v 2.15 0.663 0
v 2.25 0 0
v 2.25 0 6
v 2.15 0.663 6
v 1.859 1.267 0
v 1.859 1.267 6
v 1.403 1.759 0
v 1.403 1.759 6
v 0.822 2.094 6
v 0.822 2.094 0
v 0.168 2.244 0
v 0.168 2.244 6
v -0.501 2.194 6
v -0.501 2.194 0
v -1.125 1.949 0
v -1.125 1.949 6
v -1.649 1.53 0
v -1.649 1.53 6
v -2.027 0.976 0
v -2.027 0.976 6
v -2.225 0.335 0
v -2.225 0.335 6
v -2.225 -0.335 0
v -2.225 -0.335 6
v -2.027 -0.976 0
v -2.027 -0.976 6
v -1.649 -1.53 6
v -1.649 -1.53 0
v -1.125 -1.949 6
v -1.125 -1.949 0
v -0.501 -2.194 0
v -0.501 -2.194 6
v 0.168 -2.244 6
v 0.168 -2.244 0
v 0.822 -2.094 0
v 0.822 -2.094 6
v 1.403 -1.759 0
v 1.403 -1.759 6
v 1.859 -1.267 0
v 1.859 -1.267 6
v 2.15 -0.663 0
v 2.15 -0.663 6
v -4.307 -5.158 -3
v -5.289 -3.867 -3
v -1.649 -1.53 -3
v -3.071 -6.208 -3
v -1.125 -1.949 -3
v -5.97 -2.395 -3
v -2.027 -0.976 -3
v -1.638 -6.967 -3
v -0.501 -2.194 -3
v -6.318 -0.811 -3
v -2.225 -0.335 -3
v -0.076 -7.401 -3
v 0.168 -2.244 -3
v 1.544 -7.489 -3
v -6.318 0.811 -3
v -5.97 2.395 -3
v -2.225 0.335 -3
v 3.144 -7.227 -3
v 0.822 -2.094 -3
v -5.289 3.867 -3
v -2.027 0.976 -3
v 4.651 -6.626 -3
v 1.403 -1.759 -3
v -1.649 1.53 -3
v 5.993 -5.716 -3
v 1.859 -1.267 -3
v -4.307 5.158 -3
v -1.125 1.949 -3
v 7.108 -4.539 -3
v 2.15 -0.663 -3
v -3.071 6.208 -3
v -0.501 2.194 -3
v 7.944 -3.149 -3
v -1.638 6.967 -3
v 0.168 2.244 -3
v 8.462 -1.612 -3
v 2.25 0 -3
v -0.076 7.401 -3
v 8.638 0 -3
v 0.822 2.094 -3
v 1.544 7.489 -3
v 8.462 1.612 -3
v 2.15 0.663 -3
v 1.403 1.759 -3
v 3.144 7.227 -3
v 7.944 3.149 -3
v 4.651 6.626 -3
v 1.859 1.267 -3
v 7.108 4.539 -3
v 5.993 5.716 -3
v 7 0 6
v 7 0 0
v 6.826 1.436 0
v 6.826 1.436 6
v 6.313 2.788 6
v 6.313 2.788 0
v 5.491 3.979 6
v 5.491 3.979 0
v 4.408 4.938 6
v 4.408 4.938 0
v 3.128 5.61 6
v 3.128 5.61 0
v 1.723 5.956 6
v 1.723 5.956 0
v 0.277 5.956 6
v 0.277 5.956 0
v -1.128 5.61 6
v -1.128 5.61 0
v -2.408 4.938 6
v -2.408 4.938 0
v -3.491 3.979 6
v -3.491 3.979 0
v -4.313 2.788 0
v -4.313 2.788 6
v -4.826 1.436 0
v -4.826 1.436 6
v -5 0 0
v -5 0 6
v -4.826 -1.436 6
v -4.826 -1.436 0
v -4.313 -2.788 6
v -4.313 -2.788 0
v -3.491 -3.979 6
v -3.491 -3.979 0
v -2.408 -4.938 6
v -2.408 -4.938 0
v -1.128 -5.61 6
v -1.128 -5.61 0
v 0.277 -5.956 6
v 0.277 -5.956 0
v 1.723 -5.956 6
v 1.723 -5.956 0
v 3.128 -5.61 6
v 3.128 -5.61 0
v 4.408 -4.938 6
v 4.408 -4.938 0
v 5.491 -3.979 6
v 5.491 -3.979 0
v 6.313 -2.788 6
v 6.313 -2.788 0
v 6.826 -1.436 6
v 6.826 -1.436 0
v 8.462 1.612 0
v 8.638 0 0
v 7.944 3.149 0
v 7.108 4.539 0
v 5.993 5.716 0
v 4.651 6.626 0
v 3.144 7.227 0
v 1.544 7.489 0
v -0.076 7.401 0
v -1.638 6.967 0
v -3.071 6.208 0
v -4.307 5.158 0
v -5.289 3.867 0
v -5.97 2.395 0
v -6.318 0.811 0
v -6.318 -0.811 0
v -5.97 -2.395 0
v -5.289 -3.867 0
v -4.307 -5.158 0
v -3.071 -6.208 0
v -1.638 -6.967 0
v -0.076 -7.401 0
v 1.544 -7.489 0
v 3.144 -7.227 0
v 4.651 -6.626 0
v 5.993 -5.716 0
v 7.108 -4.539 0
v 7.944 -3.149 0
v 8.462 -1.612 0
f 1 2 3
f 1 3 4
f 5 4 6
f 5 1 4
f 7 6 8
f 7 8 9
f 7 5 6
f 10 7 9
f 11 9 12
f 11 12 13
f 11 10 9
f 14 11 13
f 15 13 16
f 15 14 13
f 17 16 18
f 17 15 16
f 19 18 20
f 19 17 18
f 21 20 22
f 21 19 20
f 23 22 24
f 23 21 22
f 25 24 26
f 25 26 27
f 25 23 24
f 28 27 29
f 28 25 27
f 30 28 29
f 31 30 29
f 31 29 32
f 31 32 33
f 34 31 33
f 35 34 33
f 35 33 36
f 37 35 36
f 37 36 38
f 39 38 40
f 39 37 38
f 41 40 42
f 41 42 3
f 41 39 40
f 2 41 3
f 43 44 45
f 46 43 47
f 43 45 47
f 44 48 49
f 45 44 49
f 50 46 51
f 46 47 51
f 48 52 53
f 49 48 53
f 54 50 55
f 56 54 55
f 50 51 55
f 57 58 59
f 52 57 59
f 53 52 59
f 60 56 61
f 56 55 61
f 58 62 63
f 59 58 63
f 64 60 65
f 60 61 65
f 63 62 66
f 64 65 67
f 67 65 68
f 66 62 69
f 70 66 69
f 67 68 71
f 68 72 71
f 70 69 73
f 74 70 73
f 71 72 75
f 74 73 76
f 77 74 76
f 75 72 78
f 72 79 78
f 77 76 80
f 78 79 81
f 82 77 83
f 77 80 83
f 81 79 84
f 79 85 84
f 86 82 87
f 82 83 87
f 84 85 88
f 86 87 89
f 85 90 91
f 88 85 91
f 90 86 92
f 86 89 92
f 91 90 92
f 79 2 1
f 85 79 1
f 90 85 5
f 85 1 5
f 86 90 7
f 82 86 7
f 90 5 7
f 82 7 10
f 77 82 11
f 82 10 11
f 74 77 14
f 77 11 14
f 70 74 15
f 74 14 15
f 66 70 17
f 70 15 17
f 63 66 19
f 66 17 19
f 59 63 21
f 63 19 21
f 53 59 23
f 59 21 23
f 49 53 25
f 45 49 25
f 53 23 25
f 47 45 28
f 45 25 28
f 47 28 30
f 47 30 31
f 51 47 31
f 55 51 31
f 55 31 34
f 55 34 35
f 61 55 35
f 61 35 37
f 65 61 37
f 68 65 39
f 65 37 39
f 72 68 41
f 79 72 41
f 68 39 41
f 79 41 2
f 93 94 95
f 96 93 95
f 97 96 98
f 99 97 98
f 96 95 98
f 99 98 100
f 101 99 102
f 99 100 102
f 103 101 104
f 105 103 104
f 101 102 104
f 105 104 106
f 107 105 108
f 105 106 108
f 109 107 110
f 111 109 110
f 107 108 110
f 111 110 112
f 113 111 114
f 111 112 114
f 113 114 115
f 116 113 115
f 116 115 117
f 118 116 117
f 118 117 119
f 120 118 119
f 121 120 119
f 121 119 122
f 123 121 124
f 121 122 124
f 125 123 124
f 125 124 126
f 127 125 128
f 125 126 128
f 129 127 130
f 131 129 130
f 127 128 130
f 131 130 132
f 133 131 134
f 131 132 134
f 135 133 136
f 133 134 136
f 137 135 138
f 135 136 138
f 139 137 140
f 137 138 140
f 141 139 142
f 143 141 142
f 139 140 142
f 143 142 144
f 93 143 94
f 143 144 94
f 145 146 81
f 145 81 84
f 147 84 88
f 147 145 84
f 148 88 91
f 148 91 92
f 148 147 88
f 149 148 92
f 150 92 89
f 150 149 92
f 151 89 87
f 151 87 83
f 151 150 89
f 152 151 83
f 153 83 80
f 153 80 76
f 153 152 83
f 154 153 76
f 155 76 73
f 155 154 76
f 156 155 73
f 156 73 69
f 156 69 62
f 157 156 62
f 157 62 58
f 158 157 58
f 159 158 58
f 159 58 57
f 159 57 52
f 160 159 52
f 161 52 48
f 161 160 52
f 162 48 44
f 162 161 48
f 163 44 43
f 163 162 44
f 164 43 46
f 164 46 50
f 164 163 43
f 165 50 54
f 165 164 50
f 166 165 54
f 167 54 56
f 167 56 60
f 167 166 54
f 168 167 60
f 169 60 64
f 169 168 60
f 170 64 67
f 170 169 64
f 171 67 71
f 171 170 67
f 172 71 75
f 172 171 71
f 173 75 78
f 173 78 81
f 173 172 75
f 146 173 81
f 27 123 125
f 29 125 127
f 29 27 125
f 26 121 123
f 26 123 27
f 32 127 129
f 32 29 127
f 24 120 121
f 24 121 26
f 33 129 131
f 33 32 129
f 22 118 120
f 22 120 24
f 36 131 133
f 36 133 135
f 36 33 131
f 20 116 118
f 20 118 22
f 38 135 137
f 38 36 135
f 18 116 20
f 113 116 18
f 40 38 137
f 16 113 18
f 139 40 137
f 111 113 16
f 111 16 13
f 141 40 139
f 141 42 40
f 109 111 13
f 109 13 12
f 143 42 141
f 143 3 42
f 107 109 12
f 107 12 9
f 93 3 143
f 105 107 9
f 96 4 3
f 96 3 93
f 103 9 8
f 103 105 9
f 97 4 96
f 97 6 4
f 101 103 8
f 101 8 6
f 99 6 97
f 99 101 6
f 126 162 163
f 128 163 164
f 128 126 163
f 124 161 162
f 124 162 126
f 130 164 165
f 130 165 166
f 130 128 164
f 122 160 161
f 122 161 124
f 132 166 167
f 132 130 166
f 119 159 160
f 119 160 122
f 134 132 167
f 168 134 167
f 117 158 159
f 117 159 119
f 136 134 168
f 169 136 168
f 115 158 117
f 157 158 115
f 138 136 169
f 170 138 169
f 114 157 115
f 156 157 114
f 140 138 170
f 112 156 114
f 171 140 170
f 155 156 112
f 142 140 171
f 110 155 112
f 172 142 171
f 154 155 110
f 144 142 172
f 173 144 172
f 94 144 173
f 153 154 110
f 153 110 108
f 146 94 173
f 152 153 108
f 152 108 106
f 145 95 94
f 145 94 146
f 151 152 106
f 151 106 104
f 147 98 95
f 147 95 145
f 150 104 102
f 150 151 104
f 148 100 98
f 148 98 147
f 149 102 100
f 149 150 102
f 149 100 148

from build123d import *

# Parameters (mm, degrees)
F0_R     = 6
F0_R_2   = 2.25
F1_DEPTH = 6
F2_R     = 7.5
F2_R_2   = 6
F3_DEPTH = 3


with BuildPart() as f1:
    # F0 (on Top) → F1 (new body)
    with BuildSketch(Plane.XY):
        with Locations((1, 0)):
            Circle(F0_R)
        Circle(F0_R_2, mode=Mode.SUBTRACT)
    extrude(amount=F1_DEPTH)

    # F2 (on face) + F0 (on Top) → F3 (join)
    with BuildSketch(Plane.XY):
        with Locations((1.137572, 0)):
            Circle(F2_R)
        with Locations((1, 0)):
            Circle(F2_R_2, mode=Mode.SUBTRACT)
    with BuildSketch(Plane.XY):
        with Locations((1, 0)):
            Circle(F0_R)
        Circle(F0_R_2, mode=Mode.SUBTRACT)
    extrude(amount=-F3_DEPTH)


solid = f1.part
